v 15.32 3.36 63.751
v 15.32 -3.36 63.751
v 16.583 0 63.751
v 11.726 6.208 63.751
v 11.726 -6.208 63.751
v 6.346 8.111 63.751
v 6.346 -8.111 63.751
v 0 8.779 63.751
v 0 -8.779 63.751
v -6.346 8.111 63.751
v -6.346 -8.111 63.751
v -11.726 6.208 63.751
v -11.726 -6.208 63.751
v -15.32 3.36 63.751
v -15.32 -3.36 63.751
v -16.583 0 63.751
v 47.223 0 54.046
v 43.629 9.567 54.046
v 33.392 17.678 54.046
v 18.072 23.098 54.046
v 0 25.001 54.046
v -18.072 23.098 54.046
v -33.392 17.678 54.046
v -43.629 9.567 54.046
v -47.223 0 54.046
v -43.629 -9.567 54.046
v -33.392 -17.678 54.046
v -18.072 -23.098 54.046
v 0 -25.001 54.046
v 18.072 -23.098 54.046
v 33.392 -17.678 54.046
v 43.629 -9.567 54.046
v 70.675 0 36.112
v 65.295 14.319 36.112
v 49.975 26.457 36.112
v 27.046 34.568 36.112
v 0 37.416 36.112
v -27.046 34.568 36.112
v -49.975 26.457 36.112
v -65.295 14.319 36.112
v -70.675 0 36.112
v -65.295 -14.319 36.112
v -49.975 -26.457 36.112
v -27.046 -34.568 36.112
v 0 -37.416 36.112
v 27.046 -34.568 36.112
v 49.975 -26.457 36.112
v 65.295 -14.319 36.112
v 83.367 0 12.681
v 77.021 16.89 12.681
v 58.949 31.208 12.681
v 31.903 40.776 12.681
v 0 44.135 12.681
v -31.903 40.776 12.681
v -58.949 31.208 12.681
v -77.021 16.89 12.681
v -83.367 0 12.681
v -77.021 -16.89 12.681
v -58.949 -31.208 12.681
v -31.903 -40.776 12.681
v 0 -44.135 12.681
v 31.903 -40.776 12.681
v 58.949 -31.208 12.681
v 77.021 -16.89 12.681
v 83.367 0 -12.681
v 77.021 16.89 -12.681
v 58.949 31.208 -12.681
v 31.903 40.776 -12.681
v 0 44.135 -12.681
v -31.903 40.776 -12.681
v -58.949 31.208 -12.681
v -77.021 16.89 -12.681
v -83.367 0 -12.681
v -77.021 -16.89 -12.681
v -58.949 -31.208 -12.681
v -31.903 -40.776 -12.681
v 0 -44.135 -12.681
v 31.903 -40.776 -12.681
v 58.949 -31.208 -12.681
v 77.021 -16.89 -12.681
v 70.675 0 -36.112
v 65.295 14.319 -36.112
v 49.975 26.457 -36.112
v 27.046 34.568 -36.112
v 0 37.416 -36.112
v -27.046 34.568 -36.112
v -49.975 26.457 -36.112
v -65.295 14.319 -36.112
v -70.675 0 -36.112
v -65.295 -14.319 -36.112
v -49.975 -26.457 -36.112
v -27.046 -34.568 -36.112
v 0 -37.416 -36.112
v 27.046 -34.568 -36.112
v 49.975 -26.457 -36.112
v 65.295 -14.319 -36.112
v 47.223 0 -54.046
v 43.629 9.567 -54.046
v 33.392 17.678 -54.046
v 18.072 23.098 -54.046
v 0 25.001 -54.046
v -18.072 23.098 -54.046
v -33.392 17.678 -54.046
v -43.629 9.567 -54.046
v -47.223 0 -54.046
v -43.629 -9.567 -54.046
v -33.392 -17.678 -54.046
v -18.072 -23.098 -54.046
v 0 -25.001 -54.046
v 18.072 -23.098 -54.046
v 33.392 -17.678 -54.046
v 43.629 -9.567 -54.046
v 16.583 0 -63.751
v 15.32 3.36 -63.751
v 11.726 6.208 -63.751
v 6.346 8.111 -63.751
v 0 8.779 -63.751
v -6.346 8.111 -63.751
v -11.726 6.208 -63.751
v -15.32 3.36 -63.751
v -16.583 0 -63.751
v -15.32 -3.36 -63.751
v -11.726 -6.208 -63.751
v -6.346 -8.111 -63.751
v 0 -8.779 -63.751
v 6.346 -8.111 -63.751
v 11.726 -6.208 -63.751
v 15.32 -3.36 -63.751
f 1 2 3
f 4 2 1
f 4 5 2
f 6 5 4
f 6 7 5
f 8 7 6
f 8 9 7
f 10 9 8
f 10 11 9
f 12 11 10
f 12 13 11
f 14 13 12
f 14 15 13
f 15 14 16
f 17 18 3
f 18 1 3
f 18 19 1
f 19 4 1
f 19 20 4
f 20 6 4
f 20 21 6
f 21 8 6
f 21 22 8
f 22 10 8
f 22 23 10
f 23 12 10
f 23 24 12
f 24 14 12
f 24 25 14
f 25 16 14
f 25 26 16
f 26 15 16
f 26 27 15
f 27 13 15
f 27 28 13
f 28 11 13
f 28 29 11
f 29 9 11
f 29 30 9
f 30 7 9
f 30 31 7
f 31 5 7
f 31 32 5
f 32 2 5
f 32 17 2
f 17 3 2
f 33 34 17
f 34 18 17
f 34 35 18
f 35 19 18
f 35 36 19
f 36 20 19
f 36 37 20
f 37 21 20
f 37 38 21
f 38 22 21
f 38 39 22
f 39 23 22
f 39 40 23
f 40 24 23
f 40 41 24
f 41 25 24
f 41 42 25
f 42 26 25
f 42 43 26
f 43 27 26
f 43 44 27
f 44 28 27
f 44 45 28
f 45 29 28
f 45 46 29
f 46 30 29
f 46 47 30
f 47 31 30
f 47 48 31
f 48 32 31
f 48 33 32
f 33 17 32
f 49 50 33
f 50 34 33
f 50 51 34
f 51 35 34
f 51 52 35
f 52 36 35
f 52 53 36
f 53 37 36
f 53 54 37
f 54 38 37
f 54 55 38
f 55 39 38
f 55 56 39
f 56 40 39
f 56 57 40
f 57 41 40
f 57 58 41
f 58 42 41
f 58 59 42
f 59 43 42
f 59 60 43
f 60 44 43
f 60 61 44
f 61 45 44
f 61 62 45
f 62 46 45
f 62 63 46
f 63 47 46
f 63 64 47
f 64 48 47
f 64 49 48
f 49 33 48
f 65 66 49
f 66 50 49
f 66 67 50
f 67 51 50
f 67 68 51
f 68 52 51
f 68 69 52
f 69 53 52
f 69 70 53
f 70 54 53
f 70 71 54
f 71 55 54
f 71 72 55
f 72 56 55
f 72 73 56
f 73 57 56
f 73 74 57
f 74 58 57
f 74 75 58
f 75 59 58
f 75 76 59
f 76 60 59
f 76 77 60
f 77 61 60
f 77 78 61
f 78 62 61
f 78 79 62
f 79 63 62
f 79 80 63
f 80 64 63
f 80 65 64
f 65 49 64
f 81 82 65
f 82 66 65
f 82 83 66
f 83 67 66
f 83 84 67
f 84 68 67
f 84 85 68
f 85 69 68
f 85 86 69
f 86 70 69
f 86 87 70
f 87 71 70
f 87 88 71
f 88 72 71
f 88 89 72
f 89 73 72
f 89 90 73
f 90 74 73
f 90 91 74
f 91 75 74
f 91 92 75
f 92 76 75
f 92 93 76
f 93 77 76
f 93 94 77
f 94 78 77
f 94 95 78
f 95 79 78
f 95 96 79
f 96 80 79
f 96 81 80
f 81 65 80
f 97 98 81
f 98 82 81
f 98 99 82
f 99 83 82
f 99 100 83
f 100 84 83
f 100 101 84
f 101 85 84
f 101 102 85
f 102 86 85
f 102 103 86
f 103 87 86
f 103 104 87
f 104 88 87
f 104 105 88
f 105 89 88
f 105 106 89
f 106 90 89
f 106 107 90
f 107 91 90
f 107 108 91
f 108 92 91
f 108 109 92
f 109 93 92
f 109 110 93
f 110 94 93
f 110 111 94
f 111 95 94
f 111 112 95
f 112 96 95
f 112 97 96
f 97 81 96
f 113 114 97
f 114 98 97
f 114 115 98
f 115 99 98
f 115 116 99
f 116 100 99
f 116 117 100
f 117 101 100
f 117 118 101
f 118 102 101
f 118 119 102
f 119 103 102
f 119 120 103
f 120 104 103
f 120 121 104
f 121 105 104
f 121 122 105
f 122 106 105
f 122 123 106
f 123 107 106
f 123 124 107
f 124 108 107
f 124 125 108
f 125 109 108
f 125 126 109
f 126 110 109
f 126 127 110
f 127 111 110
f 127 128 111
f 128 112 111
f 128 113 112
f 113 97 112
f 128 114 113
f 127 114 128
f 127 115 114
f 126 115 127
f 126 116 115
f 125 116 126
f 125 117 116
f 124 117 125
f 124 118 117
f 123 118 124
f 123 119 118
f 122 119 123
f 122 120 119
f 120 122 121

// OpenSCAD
// Generated by SolidPython 1.0.1 on 2020-07-29 00:46:53


scale(v = [17, 9, 13]) {
	sphere(r = 5);
}
/***********************************************
*********      SolidPython code:      **********
************************************************
 
# import packages: SolidPython
from solid import *
from solid.utils import *
from itertools import chain, combinations, permutations


class Resize:

    def __init__(self, scad_file):
        self.scad_file = scad_file
        #self.scad_file = import_scad(scad_file)
        # cone/cylinder param:
        self.r1 = 0
        self.r2 = 0
        self.h = 0
        # rectangular prism param:
        self.w = 0
        self.l = 0
        # ellipse param:
        self.r = 0

    # import OpenScad code (file name corresponds to shape)


    # classify shape + parameters
    def assign(self, param1, param2, param3):
        if self.scad_file == 'cone.scad':
            self.r1 = param1
            self.r2 = param2
            self.h = param3
        elif self.scad_file == 'cylinder.scad':
            self.r1 = param1
            self.r2 = param2
            self.h = param3
        elif self.scad_file == 'rectangularPrism.scad':
            self.h = param1
            self.l = param2
            self.w = param3
        else:
            self.r = param1
            self.h = param2

    # resize parameters
    def iterate(self):
        x = range(3, 20, 2)
        i = 1
        if self.scad_file == 'cone.scad':
            tempList = list(permutations(x, 2))
            for temp in tempList:
                param1 = temp[0]
                param2 = temp[1]
                filepath = 'produced_scad_files/' + 'cone' + str(param1) + '_' + str(param2) + '_' + '.scad'
                scad_render_to_file(cylinder(h=param1, r1=param2, r2=0), filepath)

        elif self.scad_file == 'cylinder.scad':
            tempList = list(permutations(x, 3))
            for temp in tempList:
                param1 = temp[0]
                param2 = temp[1]
                filepath = 'produced_scad_files/' + 'cylinder' + str(param1) + '_' + str(param2) + '_' + '.scad'
                scad_render_to_file(cylinder(h=param1, r1=param2, r2=param2), filepath)

        elif self.scad_file == 'rectangularPrism.scad':
            tempList = list(permutations(x, 3))
            for temp in tempList:
                param1 = temp[0]
                param2 = temp[1]
                param3 = temp[2]
                filepath = 'produced_scad_files/' + 'rectangularPrism' + str(param1) + '_' + str(param2) + '_' + str(
                    param3) + '.scad'
                scad_render_to_file(cube(size=(param1, param2, param3)), filepath)

        elif self.scad_file == 'ellipse.scad':
            tempList = list(permutations(x, 4))
            for temp in tempList:
                param1 = temp[0]
                param2 = temp[1]
                param3 = temp[2]
                param4 = temp[3]
                filepath = 'produced_scad_files/' + 'ellipse' + str(param1) + '_' + str(param2) + '_' + str(param3) + '_' + str(param4) + '.scad'
                scad_render_to_file(scale([param1, param2, param3])(sphere(r=param4)), filepath)

    def render_to_scadfile(self):
        scad_render_to_file(scad, 'example.scad') 
 
************************************************/
